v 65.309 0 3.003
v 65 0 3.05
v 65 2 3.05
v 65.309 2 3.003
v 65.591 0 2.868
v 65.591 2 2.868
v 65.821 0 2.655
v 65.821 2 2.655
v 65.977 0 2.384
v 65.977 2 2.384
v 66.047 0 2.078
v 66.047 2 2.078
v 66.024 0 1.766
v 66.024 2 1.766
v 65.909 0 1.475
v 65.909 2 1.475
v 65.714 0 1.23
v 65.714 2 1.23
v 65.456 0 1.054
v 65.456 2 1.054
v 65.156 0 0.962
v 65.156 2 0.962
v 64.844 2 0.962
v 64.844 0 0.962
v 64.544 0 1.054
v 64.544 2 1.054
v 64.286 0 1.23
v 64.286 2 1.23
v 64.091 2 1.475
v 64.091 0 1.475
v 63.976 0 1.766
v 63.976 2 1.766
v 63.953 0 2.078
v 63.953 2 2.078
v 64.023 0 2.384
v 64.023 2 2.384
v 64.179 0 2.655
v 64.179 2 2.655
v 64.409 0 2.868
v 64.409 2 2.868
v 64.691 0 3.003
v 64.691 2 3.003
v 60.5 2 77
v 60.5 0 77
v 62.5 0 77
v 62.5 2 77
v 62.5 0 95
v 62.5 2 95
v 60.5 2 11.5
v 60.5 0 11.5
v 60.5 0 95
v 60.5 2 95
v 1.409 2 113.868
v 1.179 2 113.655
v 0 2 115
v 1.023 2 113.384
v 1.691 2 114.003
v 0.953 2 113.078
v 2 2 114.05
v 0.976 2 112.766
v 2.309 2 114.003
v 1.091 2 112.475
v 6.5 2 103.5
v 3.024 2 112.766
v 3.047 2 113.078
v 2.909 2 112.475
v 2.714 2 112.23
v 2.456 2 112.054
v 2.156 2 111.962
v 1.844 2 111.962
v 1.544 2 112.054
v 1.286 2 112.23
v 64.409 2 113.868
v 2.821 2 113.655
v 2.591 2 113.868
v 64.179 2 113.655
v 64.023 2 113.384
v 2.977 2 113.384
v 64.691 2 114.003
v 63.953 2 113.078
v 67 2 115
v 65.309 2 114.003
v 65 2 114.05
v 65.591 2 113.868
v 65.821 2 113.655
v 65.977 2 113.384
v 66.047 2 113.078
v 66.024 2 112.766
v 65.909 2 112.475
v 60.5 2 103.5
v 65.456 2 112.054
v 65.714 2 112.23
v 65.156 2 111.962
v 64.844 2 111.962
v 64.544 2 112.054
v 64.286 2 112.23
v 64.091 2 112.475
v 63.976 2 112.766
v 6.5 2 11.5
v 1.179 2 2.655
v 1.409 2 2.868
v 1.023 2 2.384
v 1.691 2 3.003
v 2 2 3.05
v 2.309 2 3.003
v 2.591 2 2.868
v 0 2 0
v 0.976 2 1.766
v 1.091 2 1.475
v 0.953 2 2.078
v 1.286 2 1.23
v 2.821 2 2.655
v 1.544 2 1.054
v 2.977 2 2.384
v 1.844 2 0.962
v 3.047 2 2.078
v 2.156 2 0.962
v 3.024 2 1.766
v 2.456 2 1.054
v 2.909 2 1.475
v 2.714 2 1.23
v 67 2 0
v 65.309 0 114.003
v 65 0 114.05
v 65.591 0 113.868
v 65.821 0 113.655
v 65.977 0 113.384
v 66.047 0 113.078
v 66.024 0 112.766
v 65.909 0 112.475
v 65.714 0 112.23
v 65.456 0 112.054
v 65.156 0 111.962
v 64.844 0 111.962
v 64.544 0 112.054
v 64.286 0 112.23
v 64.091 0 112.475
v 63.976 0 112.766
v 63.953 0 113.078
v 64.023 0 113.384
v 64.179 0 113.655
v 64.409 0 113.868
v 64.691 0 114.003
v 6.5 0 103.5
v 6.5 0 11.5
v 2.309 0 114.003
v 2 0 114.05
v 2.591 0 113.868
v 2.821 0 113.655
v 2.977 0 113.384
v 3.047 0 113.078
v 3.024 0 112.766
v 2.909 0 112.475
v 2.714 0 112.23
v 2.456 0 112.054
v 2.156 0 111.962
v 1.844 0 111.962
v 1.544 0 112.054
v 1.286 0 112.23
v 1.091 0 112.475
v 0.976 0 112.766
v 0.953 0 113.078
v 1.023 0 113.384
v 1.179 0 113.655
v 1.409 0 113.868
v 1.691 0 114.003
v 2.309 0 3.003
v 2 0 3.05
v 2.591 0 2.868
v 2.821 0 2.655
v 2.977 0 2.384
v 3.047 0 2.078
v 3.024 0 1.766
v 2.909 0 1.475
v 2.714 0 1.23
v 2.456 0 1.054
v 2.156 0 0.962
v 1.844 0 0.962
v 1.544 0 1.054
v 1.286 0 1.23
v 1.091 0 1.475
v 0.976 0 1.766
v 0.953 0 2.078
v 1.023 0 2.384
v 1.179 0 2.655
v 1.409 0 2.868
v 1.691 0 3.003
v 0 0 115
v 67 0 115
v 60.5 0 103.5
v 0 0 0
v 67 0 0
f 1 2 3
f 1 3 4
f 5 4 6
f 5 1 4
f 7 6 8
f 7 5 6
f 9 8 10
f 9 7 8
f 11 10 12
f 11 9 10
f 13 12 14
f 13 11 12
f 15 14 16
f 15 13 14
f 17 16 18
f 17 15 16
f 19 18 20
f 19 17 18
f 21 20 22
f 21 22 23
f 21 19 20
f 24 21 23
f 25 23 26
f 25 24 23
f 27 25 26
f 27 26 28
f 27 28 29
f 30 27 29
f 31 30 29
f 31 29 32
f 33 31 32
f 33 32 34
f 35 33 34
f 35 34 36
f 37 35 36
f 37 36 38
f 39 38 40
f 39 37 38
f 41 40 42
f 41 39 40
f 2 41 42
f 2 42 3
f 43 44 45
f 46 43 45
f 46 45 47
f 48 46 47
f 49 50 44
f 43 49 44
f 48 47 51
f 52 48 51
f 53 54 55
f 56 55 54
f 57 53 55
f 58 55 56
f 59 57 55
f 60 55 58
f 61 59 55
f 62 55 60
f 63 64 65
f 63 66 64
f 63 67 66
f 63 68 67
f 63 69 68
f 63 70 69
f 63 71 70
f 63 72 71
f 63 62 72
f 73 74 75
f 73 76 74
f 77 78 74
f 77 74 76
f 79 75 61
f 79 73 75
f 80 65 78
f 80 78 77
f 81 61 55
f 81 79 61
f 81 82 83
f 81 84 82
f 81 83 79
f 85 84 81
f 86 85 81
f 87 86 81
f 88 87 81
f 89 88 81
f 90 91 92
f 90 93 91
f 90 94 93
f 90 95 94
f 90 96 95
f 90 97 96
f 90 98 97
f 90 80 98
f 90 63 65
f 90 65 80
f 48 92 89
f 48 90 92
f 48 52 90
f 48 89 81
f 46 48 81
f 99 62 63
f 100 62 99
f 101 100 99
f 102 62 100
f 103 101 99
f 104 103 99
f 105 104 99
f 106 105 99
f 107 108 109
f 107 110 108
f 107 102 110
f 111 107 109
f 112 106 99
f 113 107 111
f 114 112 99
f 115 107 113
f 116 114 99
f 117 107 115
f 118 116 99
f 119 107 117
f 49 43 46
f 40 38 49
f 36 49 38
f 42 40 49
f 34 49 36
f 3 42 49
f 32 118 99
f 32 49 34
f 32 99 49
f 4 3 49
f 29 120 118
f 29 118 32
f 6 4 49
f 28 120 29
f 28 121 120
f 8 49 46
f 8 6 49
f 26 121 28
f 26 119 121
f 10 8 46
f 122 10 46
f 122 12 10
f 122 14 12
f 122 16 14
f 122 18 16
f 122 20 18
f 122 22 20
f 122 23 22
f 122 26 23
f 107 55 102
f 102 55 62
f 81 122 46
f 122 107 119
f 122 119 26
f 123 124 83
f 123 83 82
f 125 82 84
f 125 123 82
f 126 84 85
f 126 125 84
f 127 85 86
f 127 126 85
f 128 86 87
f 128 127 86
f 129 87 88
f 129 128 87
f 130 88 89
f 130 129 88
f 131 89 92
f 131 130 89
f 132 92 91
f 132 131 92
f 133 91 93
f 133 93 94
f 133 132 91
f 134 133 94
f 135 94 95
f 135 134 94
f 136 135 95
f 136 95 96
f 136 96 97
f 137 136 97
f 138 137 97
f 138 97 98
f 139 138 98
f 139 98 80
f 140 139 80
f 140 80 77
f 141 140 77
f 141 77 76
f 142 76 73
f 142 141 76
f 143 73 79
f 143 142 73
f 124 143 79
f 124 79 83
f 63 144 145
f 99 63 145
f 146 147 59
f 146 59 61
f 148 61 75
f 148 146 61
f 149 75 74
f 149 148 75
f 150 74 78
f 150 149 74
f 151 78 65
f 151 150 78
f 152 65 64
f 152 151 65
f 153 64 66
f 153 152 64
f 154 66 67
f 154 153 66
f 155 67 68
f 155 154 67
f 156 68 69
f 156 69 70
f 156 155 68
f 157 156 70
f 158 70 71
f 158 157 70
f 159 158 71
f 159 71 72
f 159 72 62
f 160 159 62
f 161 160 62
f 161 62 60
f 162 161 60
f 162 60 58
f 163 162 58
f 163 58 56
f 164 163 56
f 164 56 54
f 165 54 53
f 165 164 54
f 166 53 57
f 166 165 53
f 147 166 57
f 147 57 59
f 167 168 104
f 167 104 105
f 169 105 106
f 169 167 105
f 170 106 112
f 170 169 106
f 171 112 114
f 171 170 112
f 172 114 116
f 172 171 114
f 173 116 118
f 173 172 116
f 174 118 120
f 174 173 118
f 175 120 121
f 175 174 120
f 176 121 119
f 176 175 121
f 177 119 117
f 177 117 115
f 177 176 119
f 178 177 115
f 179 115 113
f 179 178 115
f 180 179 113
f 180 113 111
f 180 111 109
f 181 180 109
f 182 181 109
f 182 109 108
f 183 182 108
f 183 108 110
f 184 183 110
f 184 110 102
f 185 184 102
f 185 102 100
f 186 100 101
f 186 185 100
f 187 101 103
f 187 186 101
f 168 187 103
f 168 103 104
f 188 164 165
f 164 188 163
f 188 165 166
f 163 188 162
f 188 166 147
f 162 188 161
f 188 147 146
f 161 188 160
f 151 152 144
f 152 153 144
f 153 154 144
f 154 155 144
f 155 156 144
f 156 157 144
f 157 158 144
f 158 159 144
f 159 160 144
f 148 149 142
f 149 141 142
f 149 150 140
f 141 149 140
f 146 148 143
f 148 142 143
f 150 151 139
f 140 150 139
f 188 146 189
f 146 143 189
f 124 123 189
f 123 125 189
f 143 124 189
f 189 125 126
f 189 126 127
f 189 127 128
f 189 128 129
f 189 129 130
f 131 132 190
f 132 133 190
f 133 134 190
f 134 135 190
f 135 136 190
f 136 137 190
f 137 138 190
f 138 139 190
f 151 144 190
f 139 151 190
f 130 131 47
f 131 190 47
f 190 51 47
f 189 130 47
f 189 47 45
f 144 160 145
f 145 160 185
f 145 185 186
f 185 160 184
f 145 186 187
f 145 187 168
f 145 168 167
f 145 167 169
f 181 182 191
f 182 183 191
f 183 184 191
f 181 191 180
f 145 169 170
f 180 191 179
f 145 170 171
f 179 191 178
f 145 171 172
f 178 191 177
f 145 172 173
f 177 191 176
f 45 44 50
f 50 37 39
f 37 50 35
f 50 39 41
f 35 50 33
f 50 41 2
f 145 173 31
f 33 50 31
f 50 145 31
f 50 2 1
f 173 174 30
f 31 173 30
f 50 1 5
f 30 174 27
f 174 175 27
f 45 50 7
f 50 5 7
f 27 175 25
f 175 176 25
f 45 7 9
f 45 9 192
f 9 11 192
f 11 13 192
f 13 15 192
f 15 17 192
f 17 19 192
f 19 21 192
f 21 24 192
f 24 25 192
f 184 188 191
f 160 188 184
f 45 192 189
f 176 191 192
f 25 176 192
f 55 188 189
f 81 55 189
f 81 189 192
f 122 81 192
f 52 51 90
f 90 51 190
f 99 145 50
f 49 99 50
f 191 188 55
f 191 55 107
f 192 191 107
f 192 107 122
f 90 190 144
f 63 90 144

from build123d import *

# Parameters (mm, degrees)
SKETCH_1_W      = 67
SKETCH_1_H      = 115
SKETCH_1_R      = 1.05
EXTRUDE_1_DEPTH = 2


with BuildPart() as part:
    # 草图1 → 凸台-拉伸1 (new body)
    with BuildSketch(Plane(origin=(0, 0, 0), x_dir=(1, 0, 0), z_dir=(0, 1, 0))):
        with Locations((33.5, -57.5)):
            Rectangle(SKETCH_1_W, SKETCH_1_H)
        with Locations(Location((2, -113, 0), (0, 0, 270))):
            Circle(SKETCH_1_R, mode=Mode.SUBTRACT)
        with Locations(Location((65, -113, 0), (0, 0, 270))):
            Circle(SKETCH_1_R, mode=Mode.SUBTRACT)
        Polygon((6.5, -103.5), (6.5, -11.5), (60.5, -11.5), (60.5, -77), (62.5, -77), (62.5, -95), (60.5, -95), (60.5, -103.5), align=None, mode=Mode.SUBTRACT)
        with Locations(Location((2, -2, 0), (0, 0, 270))):
            Circle(SKETCH_1_R, mode=Mode.SUBTRACT)
        with Locations(Location((65, -2, 0), (0, 0, 270))):
            Circle(SKETCH_1_R, mode=Mode.SUBTRACT)
    extrude(amount=EXTRUDE_1_DEPTH)


solid = part.part
